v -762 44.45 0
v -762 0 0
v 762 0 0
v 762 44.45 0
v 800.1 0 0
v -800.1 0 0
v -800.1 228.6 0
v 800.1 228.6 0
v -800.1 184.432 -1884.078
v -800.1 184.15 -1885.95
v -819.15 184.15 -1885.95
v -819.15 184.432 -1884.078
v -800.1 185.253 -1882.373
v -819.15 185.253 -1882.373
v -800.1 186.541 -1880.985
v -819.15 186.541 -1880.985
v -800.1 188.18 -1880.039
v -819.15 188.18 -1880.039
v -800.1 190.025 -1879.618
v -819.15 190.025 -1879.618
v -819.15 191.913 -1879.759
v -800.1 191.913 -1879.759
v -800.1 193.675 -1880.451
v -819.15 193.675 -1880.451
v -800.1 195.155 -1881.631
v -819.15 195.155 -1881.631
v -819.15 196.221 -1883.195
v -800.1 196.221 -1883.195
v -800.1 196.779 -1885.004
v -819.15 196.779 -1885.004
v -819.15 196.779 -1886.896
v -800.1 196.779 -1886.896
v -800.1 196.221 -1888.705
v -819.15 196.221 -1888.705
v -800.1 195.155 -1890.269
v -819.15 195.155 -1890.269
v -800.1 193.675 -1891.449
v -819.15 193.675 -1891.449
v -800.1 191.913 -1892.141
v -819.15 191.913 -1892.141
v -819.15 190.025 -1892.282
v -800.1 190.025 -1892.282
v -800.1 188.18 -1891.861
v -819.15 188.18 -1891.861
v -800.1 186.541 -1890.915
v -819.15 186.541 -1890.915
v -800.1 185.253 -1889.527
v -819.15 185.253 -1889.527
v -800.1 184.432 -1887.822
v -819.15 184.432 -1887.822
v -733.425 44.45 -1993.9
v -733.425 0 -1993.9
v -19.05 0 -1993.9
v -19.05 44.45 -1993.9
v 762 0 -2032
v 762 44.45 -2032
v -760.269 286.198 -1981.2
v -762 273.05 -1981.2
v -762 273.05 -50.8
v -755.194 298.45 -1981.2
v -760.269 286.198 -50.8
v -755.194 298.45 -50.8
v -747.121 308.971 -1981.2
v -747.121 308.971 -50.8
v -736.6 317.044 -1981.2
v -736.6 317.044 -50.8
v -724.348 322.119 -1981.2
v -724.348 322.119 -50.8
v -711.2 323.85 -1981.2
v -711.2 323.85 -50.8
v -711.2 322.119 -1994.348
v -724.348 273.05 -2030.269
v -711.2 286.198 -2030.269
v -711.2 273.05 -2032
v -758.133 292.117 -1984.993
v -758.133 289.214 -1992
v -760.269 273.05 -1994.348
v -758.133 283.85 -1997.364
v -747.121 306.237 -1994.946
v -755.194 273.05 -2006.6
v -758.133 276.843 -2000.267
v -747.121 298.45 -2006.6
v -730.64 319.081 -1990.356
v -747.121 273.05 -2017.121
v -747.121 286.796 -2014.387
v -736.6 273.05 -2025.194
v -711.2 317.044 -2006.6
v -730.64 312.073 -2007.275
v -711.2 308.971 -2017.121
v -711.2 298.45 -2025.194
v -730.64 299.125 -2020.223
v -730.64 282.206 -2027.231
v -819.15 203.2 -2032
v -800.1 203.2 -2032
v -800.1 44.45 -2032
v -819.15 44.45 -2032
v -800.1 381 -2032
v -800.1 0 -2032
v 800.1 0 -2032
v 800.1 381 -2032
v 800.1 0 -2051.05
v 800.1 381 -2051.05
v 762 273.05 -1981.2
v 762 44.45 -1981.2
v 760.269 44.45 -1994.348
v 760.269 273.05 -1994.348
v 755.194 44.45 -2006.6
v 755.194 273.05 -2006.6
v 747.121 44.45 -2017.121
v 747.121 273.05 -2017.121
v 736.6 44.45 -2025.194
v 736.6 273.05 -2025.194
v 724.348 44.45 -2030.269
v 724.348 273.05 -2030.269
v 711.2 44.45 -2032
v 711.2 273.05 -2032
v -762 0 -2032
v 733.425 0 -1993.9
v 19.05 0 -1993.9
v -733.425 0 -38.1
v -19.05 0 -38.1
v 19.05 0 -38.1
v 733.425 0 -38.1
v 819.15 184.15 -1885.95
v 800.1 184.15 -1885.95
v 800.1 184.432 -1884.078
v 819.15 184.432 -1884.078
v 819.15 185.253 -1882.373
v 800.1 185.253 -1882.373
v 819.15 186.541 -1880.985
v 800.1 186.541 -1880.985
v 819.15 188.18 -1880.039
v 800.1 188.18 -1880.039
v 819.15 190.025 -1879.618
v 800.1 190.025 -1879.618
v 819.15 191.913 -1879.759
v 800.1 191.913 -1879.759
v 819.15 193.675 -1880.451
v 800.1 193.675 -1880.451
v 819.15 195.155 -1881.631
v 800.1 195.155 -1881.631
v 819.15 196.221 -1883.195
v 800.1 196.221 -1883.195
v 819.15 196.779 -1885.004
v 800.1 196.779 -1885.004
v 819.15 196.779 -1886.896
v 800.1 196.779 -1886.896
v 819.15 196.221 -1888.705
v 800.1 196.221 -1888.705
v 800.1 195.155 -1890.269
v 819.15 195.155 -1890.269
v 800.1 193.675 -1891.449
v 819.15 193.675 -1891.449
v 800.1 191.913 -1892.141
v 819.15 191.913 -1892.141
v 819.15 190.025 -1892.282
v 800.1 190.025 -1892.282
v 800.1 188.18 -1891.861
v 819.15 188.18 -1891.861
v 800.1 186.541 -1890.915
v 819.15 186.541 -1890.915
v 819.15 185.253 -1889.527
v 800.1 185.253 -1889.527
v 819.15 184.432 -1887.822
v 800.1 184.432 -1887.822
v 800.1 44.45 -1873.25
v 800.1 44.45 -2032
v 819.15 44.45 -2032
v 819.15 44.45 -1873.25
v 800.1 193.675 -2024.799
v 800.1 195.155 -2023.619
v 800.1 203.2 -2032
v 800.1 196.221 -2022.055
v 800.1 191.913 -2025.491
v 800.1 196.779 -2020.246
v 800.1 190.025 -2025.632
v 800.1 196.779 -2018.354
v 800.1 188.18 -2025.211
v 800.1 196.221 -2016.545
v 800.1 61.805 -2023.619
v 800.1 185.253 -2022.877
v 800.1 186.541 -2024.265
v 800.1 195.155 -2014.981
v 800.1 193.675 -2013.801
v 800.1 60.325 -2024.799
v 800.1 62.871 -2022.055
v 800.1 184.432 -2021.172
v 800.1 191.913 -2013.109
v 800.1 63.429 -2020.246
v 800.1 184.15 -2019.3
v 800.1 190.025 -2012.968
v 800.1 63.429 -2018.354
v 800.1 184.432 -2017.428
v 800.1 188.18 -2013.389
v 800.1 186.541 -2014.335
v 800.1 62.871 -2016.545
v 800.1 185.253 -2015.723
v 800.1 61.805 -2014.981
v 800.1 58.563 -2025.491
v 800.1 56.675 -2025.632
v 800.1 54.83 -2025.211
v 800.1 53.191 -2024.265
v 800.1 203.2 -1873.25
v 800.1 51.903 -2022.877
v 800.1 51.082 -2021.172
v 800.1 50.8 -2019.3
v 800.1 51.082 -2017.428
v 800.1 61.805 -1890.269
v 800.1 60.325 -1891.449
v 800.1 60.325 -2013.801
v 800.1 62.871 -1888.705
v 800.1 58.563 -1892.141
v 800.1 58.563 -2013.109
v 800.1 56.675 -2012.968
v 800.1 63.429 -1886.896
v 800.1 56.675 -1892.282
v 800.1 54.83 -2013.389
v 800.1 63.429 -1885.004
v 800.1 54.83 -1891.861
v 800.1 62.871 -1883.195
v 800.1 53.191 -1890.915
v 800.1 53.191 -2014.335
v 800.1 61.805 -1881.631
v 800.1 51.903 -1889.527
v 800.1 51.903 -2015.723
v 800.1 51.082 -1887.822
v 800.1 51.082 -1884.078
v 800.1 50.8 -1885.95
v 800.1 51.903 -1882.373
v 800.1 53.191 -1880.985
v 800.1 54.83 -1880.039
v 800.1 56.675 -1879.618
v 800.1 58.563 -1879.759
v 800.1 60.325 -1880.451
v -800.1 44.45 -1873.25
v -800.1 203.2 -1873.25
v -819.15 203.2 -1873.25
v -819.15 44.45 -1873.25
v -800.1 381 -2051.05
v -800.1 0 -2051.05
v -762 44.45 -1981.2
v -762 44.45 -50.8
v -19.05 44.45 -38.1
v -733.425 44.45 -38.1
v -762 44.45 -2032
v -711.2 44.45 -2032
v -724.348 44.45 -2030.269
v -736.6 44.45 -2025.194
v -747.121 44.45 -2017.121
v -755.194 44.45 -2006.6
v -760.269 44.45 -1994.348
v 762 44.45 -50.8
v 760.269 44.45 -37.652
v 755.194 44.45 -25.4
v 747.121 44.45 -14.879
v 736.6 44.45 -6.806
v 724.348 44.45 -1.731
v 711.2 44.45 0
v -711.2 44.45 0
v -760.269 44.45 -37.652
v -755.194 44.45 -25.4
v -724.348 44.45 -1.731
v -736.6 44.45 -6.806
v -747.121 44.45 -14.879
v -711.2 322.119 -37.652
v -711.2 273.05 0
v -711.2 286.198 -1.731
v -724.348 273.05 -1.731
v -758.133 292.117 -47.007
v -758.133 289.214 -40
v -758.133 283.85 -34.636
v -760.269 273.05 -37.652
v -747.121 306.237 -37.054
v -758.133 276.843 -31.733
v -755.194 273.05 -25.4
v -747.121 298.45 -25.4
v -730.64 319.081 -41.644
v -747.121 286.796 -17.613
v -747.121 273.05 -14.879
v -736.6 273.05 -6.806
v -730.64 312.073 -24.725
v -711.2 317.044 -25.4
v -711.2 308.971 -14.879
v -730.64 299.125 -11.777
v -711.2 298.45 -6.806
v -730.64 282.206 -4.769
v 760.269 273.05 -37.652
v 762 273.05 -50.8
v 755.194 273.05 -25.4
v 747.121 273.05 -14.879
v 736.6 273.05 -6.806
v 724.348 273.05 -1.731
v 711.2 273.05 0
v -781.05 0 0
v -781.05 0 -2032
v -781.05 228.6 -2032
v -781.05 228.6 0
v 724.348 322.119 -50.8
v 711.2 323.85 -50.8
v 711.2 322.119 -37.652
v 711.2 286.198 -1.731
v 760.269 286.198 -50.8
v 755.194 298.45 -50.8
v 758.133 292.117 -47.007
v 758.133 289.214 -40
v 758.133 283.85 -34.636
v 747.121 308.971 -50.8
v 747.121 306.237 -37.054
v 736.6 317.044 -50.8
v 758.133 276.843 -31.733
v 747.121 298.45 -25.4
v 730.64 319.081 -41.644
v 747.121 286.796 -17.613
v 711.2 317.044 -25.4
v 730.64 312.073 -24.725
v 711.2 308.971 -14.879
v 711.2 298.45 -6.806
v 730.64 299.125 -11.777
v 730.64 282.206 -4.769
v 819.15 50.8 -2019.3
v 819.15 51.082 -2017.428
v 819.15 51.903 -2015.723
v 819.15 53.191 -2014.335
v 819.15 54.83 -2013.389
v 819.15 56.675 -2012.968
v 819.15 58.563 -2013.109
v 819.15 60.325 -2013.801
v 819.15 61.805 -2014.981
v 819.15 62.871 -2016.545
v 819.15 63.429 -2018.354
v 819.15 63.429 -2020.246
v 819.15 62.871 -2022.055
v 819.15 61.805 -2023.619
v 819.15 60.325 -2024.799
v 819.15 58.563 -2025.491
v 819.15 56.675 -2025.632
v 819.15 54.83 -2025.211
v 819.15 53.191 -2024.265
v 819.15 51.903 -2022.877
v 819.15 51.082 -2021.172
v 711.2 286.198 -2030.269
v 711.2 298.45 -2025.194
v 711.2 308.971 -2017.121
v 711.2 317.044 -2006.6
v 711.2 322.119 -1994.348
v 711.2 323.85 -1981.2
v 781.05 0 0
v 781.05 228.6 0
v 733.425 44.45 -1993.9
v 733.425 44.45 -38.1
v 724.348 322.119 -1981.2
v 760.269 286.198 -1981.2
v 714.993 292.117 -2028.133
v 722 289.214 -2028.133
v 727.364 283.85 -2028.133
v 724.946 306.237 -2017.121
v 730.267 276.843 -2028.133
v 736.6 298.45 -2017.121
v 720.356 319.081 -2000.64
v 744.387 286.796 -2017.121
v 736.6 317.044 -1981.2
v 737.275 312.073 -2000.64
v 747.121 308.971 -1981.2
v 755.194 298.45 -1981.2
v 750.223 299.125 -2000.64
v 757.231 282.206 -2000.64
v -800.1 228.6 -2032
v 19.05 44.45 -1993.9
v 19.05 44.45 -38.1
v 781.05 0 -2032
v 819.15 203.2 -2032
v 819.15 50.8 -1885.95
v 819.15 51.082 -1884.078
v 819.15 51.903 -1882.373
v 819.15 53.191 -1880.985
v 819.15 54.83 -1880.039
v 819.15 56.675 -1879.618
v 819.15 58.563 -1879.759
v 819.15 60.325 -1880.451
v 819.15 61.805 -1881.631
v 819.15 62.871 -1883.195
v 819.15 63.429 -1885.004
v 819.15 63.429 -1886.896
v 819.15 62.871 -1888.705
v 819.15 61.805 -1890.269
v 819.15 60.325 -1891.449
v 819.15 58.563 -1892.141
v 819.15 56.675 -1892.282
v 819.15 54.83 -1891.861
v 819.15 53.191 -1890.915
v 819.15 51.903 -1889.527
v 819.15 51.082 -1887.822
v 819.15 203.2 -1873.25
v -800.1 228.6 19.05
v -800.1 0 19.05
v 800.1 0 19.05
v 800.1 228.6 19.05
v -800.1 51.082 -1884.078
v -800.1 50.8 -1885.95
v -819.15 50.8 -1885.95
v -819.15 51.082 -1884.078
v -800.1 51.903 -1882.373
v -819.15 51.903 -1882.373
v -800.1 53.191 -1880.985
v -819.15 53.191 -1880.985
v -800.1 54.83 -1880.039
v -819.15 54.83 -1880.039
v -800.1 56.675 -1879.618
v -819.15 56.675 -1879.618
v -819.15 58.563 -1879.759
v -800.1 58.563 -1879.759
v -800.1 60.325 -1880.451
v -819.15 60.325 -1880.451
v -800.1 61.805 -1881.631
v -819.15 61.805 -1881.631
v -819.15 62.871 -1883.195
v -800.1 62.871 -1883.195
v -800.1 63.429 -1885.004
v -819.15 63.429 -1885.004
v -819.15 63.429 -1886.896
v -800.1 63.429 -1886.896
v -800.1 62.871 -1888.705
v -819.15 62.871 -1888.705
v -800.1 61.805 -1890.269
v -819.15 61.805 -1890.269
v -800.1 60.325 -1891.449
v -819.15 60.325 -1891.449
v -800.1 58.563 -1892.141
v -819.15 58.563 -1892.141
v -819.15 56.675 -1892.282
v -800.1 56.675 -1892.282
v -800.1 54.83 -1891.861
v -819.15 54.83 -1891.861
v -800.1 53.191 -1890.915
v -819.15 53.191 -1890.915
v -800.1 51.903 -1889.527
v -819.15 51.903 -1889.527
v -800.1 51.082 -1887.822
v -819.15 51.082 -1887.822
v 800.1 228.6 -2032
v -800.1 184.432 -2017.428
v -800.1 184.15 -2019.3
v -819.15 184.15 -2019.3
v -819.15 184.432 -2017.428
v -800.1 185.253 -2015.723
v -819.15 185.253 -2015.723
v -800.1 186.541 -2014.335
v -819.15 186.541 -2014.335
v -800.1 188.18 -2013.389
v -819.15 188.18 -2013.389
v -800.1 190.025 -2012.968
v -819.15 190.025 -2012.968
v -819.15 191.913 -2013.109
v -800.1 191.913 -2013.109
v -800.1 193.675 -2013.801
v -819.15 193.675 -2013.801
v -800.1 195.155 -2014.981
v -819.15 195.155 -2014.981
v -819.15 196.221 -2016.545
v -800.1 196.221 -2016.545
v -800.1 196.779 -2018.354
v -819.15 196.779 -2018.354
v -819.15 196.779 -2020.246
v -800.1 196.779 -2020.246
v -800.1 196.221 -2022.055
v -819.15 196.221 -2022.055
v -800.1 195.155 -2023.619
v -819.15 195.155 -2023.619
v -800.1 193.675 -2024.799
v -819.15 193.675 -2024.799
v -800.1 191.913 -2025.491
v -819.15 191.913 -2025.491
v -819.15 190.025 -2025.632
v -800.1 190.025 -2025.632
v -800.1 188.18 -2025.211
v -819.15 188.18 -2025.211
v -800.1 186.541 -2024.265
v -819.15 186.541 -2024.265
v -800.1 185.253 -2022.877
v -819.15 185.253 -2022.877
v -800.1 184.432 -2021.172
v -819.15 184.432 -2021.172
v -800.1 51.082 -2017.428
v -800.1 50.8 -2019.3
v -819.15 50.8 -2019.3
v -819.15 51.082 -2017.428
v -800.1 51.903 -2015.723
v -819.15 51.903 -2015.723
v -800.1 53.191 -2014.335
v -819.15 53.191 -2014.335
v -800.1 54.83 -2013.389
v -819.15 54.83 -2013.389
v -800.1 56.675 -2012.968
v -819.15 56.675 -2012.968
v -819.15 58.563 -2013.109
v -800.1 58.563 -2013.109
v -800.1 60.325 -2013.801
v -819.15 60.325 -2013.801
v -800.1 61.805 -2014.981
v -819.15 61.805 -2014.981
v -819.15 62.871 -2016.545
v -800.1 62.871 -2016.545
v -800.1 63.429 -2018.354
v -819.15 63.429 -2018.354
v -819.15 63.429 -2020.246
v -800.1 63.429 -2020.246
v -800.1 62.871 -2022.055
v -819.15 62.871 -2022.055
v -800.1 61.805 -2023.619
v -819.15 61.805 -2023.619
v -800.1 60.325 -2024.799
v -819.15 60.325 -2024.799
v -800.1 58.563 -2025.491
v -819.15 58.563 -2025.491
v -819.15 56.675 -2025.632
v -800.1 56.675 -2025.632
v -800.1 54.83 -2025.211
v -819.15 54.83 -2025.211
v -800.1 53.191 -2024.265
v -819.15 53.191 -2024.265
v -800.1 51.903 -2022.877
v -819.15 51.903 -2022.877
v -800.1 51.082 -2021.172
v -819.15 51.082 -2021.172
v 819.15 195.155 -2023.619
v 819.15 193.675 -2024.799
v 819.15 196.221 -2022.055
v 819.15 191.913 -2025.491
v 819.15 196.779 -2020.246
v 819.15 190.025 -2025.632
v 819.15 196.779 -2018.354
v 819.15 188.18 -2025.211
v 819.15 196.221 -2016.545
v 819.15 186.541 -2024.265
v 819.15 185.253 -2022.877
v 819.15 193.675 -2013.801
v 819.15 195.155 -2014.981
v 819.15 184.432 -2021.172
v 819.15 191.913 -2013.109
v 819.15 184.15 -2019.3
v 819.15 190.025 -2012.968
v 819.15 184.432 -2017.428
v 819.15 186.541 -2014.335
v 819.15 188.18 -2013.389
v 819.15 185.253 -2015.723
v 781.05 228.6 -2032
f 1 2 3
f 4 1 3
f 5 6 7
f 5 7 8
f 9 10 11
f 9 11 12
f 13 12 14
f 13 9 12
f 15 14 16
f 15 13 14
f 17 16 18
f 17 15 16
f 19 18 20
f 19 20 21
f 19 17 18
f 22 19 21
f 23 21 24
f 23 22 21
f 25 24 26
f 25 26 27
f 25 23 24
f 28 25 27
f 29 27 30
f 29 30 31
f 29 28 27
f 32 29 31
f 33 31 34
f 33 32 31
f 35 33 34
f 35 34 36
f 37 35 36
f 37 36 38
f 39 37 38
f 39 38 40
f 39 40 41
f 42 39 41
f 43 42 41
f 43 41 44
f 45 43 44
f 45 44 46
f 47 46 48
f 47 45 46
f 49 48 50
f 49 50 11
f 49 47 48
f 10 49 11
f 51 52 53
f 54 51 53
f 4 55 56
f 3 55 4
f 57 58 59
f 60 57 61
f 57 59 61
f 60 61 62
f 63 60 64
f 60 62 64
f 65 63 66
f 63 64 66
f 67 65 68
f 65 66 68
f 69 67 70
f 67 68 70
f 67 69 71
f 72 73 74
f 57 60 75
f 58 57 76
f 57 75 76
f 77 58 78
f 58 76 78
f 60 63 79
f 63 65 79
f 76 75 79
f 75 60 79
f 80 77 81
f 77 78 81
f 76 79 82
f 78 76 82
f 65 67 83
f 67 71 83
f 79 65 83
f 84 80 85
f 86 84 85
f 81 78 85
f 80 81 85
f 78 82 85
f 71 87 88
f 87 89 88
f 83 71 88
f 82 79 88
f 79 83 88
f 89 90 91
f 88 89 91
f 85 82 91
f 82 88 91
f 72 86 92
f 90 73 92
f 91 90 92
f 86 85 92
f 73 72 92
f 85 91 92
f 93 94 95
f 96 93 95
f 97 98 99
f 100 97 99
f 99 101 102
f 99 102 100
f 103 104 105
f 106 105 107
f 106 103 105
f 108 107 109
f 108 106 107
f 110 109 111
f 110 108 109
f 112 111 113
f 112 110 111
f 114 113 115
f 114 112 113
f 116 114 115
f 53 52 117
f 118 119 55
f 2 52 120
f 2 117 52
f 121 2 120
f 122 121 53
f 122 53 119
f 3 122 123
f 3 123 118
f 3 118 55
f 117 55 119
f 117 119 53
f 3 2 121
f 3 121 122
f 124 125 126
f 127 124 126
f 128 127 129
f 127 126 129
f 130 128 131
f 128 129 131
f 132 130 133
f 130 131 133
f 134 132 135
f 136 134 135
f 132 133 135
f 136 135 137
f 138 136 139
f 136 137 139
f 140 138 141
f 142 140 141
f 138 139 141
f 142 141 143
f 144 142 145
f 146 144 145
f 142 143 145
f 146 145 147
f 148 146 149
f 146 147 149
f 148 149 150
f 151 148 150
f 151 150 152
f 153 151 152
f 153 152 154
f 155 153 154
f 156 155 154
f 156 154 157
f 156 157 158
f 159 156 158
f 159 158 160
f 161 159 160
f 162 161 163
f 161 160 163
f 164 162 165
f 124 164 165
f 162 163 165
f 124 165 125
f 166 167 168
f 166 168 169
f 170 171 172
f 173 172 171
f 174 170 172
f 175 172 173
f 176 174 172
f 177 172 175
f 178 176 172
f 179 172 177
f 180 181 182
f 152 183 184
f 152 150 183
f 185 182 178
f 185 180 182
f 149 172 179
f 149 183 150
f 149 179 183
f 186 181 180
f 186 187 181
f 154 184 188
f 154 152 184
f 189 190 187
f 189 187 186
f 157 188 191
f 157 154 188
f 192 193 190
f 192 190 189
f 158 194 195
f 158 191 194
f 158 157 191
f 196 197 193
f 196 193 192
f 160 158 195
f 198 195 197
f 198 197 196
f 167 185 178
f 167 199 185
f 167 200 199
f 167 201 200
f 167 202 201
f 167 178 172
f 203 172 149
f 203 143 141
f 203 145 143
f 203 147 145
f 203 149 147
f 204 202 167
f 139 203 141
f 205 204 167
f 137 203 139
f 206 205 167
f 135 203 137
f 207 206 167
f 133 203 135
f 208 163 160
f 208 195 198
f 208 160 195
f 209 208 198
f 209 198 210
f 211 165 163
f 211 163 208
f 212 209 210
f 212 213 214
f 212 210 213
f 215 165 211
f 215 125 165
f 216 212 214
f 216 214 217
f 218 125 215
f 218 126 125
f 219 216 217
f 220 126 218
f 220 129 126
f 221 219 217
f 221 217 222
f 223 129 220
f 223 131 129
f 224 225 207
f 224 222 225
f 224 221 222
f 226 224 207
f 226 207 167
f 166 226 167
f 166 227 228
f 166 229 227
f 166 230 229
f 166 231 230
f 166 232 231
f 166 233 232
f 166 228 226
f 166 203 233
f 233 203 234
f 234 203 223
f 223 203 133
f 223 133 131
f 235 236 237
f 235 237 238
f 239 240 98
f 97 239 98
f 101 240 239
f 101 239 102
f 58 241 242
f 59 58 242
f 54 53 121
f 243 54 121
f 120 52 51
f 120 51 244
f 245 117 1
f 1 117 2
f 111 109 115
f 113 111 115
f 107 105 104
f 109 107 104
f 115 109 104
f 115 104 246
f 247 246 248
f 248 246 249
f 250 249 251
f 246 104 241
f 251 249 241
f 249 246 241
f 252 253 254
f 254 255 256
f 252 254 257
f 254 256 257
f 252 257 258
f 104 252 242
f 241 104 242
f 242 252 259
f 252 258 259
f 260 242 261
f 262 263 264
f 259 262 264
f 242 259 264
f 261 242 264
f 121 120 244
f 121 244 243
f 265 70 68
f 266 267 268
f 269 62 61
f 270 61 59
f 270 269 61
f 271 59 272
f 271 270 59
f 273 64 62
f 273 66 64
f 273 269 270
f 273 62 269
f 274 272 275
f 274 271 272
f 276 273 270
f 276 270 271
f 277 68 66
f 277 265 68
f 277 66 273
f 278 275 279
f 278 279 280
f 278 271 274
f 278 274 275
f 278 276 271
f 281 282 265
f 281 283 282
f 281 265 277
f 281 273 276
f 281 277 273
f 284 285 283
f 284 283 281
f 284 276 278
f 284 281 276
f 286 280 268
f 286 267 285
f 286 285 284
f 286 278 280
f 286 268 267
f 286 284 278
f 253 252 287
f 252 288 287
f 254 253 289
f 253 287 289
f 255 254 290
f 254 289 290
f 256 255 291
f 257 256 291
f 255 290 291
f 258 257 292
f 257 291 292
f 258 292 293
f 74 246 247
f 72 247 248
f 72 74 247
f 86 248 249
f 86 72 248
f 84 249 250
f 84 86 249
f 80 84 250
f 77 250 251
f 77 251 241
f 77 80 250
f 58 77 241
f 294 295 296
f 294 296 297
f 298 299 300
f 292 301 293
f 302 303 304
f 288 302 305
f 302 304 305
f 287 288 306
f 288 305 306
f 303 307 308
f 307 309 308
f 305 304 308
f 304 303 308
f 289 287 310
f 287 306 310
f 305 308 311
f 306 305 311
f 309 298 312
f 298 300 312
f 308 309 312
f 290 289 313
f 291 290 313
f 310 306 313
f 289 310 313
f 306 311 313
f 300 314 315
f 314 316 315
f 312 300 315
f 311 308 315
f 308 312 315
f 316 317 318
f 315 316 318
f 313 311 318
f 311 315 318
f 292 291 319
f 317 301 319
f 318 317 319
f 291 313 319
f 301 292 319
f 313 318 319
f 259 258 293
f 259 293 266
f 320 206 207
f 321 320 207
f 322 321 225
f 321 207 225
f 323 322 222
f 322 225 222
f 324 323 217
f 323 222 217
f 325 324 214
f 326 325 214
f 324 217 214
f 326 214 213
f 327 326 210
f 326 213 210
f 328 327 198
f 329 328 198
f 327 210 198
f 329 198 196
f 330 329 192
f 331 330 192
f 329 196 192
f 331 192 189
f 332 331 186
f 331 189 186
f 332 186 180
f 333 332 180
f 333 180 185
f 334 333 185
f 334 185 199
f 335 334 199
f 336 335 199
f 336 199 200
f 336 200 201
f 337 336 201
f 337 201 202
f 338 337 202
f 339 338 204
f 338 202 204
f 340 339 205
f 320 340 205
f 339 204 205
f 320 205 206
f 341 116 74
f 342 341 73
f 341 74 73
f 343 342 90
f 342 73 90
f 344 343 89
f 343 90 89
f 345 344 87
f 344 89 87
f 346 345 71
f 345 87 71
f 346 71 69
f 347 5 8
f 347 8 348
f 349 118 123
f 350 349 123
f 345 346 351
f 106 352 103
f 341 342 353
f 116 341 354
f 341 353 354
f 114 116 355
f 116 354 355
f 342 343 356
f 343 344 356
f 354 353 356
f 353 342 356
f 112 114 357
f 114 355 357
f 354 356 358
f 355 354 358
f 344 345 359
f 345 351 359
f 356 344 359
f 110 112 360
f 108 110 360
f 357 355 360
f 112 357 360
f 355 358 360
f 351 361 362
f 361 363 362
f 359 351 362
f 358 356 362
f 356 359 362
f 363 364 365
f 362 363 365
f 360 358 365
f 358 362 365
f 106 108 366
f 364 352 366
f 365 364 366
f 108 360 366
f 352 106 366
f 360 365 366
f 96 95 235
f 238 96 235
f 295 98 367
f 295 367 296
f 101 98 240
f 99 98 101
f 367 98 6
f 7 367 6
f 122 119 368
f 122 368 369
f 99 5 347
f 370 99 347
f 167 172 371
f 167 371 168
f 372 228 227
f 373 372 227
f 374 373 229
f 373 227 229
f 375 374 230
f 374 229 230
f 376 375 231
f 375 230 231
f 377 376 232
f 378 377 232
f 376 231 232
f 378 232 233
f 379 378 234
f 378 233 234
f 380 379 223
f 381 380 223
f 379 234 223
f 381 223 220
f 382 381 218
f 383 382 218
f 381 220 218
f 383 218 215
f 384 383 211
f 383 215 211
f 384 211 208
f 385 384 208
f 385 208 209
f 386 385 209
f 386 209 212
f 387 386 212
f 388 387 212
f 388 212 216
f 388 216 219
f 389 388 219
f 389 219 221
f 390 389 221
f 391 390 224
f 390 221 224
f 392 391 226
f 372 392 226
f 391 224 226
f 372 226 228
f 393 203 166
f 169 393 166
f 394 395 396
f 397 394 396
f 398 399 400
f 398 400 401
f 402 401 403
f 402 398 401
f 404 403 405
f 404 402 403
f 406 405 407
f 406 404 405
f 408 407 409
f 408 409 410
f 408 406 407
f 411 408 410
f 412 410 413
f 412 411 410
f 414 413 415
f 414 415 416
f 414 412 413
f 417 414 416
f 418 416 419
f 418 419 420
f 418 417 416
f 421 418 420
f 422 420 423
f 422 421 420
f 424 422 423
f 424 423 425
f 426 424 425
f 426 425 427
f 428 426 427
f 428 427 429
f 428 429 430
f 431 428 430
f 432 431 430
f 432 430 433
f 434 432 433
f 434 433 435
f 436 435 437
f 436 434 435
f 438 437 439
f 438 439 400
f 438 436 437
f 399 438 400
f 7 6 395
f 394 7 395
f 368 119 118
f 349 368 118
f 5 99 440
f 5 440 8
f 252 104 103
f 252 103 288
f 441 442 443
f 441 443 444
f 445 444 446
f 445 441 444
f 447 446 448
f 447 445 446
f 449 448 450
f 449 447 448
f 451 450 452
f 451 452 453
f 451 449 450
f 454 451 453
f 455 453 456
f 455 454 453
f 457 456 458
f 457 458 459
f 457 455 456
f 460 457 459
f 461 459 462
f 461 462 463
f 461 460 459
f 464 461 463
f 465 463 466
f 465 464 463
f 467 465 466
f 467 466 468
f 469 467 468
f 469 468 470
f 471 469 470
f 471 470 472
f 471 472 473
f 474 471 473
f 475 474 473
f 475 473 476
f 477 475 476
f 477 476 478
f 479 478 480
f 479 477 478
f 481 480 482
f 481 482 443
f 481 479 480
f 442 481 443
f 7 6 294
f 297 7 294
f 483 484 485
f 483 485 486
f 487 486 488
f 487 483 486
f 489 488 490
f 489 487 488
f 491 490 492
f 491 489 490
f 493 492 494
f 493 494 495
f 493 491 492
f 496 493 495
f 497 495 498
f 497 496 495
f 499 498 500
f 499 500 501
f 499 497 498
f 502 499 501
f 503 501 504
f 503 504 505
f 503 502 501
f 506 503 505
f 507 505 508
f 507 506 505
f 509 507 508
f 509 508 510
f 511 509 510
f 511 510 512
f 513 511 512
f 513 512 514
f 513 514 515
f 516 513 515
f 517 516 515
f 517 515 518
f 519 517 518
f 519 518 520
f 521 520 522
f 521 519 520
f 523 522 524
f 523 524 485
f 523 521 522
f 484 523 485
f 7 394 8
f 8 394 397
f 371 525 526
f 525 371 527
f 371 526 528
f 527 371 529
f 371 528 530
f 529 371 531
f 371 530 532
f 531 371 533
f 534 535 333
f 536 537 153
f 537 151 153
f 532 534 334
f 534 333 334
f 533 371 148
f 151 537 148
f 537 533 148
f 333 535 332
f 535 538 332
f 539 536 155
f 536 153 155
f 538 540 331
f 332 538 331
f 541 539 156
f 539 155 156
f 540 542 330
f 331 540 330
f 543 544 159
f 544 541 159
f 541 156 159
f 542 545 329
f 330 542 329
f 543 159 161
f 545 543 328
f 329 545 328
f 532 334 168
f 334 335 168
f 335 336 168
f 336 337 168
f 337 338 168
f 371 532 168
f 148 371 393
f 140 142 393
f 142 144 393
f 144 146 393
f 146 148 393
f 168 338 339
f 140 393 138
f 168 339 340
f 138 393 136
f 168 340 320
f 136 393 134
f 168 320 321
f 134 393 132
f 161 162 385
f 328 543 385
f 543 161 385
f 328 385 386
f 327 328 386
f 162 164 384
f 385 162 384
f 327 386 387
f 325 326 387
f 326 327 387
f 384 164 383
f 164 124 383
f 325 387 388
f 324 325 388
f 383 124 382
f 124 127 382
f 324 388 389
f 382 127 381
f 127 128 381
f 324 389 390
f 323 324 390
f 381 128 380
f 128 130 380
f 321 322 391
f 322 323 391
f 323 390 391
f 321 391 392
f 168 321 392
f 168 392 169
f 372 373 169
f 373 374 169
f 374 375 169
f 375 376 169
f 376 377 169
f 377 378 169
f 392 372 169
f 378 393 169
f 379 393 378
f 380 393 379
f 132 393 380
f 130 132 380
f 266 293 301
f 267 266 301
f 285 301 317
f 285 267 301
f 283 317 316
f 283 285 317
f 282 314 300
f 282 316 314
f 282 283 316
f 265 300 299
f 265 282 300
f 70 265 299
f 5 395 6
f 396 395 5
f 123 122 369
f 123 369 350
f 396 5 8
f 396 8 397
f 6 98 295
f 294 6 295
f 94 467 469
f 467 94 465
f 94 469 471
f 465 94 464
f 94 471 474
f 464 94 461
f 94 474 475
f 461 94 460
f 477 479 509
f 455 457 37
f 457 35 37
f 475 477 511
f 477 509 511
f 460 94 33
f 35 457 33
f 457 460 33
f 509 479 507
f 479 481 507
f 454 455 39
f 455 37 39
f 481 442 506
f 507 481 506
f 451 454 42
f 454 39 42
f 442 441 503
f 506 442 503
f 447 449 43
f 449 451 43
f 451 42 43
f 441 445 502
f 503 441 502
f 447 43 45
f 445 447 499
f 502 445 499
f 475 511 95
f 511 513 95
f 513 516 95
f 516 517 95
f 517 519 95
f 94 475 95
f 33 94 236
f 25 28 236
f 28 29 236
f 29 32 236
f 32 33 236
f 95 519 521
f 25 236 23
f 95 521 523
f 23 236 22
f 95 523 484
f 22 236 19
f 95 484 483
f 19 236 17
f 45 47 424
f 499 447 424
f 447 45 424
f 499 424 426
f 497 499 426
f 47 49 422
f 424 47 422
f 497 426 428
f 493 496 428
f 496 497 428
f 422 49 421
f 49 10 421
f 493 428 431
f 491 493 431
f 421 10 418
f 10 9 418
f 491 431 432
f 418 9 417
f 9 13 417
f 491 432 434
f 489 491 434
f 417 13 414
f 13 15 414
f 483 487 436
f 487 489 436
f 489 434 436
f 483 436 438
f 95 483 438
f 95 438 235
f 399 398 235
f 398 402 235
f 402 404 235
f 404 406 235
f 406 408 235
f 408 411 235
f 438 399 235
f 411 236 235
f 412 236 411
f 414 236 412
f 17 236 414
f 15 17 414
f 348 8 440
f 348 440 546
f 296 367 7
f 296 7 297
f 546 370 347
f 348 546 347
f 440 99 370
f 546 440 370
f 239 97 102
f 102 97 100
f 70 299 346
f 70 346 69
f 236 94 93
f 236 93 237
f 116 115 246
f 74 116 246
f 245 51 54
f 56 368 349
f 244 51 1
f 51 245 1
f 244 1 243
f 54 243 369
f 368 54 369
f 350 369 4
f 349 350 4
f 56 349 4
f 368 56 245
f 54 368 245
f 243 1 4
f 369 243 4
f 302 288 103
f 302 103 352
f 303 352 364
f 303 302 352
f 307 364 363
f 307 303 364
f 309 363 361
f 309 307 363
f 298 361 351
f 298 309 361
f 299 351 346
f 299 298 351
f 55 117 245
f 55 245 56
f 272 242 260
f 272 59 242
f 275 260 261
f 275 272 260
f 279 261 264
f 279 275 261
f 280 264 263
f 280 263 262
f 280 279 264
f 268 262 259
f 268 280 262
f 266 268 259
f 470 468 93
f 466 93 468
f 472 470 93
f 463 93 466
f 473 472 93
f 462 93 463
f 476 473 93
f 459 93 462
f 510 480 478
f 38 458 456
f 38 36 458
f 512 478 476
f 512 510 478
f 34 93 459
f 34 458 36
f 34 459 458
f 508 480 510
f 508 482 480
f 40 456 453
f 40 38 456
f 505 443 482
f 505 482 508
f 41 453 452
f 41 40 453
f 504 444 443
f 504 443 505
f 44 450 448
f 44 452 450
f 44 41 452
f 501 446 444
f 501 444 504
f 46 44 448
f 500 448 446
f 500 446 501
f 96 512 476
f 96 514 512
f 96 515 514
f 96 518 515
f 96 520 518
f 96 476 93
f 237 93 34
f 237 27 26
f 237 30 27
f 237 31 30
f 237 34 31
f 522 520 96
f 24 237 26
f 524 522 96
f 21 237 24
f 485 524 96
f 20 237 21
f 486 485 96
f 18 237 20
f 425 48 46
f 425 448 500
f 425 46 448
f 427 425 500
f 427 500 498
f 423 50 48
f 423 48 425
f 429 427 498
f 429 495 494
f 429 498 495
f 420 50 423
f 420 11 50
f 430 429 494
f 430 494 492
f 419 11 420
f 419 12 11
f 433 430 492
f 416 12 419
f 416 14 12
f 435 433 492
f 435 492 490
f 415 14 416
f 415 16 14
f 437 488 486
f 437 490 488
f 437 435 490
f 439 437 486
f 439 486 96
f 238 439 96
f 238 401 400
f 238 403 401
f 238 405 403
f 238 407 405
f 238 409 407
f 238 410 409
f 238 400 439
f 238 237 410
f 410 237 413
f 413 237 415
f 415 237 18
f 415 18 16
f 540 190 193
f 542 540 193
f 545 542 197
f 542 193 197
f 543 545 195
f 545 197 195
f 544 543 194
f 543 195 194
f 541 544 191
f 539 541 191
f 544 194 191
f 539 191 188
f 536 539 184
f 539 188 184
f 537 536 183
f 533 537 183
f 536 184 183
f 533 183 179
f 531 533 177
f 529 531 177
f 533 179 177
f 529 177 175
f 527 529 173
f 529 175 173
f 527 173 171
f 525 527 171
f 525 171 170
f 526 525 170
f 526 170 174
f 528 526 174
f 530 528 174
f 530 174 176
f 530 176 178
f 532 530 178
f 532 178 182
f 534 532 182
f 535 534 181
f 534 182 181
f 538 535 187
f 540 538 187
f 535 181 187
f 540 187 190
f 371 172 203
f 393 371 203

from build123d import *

# Parameters (mm, degrees)
F0_W      = 1524
F0_H      = 2032
F0_W_2    = 714.375
F0_H_2    = 1955.8
F1_DEPTH  = 44.45
F2_W      = 1524
F2_H      = 2032
F3_DEPTH  = 279.4
F4_R      = 50.8
F5_W      = 1600.2
F5_H      = 19.05
F6_DEPTH  = 381
F7_W      = 19.05
F7_H      = 2032
F8_DEPTH  = 228.6
F11_W     = 1600.2
F11_H     = 19.05
F12_DEPTH = 228.6
F13_W     = 158.75
F13_H     = 158.75
F13_R     = 6.35
F14_DEPTH = 19.05


with BuildPart() as f1:
    # F0 (on Front) → F1 (new body)
    with BuildSketch(Plane.XZ):
        with Locations((0, -1016)):
            Rectangle(F0_W, F0_H)
        with Locations((-376.2375, -1016)):
            Rectangle(F0_W_2, F0_H_2, mode=Mode.SUBTRACT)
        with Locations((376.2375, -1016)):
            Rectangle(F0_W_2, F0_H_2, mode=Mode.SUBTRACT)
    extrude(amount=-F1_DEPTH)


with BuildPart() as f3:
    # F2 (on face) → F3 (new body)
    with BuildSketch(Plane(origin=(0, 44.45, 0), x_dir=(-1, 0, 0), z_dir=(0, 1, 0))):
        with Locations((0, -1016)):
            Rectangle(F2_W, F2_H)
    extrude(amount=F3_DEPTH)

    # F4
    f4_edges = [f3.edges().sort_by_distance(p)[0] for p in [
        (0, 323.85, 0),
        (762, 323.85, -1016),
        (0, 323.85, -2032),
        (-762, 323.85, -1016),
        (-762, 184.15, -2032),
        (762, 184.15, -2032),
        (762, 184.15, 0),
        (-762, 184.15, 0),
    ]]
    fillet(f4_edges, radius=F4_R)


with BuildPart() as f6:
    # F5 (on face) → F6 (new body)
    with BuildSketch(Plane.XZ):
        with Locations((0, -2041.525)):
            Rectangle(F5_W, F5_H)
    extrude(amount=-F6_DEPTH)


with BuildPart() as f8:
    # F7 (on face) → F8 (new body)
    with BuildSketch(Plane.XZ):
        with Locations((-790.575, -1016)):
            Rectangle(F7_W, F7_H)
    extrude(amount=-F8_DEPTH)


with BuildPart() as f9_1:
    # F9: instance of F8
    add(f8.part.mirror(Plane.YZ))


with BuildPart() as f12:
    # F11 (on face) → F12 (new body, through all)
    with BuildSketch(Plane.XZ):
        with Locations((0, 9.525)):
            Rectangle(F11_W, F11_H)
    extrude(amount=-F12_DEPTH)


with BuildPart() as f14:
    # F13 (on face) → F14 (new body)
    with BuildSketch(Plane(origin=(-800.1, 0, 0), x_dir=(0, -1, 0), z_dir=(-1, 0, 0))):
        with Locations((-123.825, -1952.625)):
            Rectangle(F13_W, F13_H)
        with Locations((-190.5, -2019.3)):
            Circle(F13_R, mode=Mode.SUBTRACT)
        with Locations((-57.15, -2019.3)):
            Circle(F13_R, mode=Mode.SUBTRACT)
        with Locations((-190.5, -1885.95)):
            Circle(F13_R, mode=Mode.SUBTRACT)
        with Locations((-57.15, -1885.95)):
            Circle(F13_R, mode=Mode.SUBTRACT)
    extrude(amount=F14_DEPTH)


with BuildPart() as f15_1:
    # F15: instance of F14
    add(f14.part.mirror(Plane.YZ))


solid = Compound([f1.part, f3.part, f6.part, f8.part, f9_1.part, f12.part, f14.part, f15_1.part])
